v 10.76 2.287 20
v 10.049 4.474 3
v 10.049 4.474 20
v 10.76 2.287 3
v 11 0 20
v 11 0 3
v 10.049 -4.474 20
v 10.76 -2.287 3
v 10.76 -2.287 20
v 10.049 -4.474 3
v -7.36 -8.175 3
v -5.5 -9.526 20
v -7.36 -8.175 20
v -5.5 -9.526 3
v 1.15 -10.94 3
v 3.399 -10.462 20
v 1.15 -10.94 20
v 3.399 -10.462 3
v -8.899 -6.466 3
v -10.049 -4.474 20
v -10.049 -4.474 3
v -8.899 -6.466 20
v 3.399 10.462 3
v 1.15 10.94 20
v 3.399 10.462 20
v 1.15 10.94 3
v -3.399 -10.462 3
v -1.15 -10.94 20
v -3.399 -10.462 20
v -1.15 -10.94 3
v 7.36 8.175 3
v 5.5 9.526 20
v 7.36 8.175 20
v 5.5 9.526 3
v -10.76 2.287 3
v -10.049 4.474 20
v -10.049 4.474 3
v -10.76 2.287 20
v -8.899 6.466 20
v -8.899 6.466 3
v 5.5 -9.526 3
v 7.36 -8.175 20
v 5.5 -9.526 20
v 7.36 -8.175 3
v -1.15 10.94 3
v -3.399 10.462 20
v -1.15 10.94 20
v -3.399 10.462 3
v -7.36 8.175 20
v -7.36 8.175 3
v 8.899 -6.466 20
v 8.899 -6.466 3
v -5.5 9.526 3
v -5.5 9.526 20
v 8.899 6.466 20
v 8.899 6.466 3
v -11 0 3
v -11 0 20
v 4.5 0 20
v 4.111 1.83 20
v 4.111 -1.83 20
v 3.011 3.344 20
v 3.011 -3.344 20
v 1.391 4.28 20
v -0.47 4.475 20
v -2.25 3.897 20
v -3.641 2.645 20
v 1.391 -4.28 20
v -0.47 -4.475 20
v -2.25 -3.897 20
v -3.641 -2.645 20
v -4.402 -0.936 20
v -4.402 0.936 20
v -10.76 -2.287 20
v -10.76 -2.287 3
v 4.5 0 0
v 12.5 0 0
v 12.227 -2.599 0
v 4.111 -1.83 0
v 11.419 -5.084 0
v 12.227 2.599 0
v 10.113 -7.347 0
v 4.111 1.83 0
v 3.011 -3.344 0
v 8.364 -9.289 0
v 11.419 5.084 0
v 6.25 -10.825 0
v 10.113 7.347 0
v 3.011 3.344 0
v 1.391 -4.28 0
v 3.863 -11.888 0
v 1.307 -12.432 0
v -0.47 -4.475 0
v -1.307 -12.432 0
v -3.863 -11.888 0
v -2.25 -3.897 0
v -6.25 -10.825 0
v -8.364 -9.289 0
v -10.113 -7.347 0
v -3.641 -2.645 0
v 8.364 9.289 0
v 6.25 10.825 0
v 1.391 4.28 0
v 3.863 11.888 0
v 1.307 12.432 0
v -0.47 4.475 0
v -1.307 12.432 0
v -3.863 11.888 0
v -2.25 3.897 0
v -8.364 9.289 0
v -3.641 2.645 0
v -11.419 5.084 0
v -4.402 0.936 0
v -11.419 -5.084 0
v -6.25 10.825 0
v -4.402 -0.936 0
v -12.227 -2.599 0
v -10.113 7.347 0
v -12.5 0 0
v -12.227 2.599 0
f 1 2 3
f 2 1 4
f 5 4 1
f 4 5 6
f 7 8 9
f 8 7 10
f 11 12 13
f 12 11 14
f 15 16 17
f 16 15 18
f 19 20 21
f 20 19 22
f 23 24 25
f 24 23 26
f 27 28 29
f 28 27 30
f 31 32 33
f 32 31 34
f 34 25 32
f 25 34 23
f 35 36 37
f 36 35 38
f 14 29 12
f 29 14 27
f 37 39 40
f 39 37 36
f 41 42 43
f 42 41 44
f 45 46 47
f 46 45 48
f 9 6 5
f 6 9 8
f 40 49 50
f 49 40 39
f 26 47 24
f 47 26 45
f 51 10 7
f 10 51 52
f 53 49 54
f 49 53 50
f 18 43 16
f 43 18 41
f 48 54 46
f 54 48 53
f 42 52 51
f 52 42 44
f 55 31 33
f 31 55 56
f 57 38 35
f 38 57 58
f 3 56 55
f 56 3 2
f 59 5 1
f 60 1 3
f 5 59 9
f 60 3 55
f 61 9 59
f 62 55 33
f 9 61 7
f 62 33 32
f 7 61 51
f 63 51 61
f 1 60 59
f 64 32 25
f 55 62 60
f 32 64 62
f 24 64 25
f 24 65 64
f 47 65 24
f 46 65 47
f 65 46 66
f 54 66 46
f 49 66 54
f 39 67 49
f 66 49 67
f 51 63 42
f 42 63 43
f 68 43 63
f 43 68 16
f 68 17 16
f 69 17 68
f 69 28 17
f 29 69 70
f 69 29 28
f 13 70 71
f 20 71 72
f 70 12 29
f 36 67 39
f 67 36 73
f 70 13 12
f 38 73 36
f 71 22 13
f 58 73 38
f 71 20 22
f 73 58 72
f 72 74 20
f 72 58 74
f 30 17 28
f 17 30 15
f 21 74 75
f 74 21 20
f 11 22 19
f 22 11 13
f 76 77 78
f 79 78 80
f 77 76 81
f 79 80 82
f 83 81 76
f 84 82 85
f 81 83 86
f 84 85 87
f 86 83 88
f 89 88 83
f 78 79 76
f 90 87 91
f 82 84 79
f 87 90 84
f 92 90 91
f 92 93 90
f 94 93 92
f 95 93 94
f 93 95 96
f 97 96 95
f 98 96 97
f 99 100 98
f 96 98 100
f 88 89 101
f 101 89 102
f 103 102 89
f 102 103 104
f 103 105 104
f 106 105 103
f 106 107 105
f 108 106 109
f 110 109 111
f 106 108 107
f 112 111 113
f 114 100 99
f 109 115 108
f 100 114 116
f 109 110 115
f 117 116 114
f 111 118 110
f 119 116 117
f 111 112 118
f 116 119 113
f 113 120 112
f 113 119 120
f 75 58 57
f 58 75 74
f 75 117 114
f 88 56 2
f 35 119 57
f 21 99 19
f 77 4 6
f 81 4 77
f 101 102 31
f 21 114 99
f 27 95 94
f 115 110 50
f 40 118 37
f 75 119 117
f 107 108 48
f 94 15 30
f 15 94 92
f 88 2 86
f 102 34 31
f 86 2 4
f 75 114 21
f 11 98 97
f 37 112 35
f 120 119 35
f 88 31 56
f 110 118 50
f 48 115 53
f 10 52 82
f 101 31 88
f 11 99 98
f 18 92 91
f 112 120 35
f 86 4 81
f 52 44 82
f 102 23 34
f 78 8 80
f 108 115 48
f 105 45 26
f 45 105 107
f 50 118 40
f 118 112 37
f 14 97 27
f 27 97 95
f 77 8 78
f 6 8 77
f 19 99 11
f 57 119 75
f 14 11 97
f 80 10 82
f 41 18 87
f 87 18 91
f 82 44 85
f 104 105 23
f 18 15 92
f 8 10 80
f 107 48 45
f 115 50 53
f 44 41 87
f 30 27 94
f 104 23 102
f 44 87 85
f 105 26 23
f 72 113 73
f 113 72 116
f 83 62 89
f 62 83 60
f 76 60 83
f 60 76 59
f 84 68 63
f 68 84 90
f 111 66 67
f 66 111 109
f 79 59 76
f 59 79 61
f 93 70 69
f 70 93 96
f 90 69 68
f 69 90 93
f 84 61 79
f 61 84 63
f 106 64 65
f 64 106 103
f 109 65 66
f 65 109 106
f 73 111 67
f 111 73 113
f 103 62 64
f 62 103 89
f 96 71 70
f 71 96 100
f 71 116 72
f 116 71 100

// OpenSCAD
difference() {
    union() {
        cylinder(d=22,h=7.5+2.5+10);
        cylinder(d1=25,d2=22,h=3);
    }
    
    translate([0,0,-1])
        cylinder(d=9,h=2+7.5+2.5+10);
}
